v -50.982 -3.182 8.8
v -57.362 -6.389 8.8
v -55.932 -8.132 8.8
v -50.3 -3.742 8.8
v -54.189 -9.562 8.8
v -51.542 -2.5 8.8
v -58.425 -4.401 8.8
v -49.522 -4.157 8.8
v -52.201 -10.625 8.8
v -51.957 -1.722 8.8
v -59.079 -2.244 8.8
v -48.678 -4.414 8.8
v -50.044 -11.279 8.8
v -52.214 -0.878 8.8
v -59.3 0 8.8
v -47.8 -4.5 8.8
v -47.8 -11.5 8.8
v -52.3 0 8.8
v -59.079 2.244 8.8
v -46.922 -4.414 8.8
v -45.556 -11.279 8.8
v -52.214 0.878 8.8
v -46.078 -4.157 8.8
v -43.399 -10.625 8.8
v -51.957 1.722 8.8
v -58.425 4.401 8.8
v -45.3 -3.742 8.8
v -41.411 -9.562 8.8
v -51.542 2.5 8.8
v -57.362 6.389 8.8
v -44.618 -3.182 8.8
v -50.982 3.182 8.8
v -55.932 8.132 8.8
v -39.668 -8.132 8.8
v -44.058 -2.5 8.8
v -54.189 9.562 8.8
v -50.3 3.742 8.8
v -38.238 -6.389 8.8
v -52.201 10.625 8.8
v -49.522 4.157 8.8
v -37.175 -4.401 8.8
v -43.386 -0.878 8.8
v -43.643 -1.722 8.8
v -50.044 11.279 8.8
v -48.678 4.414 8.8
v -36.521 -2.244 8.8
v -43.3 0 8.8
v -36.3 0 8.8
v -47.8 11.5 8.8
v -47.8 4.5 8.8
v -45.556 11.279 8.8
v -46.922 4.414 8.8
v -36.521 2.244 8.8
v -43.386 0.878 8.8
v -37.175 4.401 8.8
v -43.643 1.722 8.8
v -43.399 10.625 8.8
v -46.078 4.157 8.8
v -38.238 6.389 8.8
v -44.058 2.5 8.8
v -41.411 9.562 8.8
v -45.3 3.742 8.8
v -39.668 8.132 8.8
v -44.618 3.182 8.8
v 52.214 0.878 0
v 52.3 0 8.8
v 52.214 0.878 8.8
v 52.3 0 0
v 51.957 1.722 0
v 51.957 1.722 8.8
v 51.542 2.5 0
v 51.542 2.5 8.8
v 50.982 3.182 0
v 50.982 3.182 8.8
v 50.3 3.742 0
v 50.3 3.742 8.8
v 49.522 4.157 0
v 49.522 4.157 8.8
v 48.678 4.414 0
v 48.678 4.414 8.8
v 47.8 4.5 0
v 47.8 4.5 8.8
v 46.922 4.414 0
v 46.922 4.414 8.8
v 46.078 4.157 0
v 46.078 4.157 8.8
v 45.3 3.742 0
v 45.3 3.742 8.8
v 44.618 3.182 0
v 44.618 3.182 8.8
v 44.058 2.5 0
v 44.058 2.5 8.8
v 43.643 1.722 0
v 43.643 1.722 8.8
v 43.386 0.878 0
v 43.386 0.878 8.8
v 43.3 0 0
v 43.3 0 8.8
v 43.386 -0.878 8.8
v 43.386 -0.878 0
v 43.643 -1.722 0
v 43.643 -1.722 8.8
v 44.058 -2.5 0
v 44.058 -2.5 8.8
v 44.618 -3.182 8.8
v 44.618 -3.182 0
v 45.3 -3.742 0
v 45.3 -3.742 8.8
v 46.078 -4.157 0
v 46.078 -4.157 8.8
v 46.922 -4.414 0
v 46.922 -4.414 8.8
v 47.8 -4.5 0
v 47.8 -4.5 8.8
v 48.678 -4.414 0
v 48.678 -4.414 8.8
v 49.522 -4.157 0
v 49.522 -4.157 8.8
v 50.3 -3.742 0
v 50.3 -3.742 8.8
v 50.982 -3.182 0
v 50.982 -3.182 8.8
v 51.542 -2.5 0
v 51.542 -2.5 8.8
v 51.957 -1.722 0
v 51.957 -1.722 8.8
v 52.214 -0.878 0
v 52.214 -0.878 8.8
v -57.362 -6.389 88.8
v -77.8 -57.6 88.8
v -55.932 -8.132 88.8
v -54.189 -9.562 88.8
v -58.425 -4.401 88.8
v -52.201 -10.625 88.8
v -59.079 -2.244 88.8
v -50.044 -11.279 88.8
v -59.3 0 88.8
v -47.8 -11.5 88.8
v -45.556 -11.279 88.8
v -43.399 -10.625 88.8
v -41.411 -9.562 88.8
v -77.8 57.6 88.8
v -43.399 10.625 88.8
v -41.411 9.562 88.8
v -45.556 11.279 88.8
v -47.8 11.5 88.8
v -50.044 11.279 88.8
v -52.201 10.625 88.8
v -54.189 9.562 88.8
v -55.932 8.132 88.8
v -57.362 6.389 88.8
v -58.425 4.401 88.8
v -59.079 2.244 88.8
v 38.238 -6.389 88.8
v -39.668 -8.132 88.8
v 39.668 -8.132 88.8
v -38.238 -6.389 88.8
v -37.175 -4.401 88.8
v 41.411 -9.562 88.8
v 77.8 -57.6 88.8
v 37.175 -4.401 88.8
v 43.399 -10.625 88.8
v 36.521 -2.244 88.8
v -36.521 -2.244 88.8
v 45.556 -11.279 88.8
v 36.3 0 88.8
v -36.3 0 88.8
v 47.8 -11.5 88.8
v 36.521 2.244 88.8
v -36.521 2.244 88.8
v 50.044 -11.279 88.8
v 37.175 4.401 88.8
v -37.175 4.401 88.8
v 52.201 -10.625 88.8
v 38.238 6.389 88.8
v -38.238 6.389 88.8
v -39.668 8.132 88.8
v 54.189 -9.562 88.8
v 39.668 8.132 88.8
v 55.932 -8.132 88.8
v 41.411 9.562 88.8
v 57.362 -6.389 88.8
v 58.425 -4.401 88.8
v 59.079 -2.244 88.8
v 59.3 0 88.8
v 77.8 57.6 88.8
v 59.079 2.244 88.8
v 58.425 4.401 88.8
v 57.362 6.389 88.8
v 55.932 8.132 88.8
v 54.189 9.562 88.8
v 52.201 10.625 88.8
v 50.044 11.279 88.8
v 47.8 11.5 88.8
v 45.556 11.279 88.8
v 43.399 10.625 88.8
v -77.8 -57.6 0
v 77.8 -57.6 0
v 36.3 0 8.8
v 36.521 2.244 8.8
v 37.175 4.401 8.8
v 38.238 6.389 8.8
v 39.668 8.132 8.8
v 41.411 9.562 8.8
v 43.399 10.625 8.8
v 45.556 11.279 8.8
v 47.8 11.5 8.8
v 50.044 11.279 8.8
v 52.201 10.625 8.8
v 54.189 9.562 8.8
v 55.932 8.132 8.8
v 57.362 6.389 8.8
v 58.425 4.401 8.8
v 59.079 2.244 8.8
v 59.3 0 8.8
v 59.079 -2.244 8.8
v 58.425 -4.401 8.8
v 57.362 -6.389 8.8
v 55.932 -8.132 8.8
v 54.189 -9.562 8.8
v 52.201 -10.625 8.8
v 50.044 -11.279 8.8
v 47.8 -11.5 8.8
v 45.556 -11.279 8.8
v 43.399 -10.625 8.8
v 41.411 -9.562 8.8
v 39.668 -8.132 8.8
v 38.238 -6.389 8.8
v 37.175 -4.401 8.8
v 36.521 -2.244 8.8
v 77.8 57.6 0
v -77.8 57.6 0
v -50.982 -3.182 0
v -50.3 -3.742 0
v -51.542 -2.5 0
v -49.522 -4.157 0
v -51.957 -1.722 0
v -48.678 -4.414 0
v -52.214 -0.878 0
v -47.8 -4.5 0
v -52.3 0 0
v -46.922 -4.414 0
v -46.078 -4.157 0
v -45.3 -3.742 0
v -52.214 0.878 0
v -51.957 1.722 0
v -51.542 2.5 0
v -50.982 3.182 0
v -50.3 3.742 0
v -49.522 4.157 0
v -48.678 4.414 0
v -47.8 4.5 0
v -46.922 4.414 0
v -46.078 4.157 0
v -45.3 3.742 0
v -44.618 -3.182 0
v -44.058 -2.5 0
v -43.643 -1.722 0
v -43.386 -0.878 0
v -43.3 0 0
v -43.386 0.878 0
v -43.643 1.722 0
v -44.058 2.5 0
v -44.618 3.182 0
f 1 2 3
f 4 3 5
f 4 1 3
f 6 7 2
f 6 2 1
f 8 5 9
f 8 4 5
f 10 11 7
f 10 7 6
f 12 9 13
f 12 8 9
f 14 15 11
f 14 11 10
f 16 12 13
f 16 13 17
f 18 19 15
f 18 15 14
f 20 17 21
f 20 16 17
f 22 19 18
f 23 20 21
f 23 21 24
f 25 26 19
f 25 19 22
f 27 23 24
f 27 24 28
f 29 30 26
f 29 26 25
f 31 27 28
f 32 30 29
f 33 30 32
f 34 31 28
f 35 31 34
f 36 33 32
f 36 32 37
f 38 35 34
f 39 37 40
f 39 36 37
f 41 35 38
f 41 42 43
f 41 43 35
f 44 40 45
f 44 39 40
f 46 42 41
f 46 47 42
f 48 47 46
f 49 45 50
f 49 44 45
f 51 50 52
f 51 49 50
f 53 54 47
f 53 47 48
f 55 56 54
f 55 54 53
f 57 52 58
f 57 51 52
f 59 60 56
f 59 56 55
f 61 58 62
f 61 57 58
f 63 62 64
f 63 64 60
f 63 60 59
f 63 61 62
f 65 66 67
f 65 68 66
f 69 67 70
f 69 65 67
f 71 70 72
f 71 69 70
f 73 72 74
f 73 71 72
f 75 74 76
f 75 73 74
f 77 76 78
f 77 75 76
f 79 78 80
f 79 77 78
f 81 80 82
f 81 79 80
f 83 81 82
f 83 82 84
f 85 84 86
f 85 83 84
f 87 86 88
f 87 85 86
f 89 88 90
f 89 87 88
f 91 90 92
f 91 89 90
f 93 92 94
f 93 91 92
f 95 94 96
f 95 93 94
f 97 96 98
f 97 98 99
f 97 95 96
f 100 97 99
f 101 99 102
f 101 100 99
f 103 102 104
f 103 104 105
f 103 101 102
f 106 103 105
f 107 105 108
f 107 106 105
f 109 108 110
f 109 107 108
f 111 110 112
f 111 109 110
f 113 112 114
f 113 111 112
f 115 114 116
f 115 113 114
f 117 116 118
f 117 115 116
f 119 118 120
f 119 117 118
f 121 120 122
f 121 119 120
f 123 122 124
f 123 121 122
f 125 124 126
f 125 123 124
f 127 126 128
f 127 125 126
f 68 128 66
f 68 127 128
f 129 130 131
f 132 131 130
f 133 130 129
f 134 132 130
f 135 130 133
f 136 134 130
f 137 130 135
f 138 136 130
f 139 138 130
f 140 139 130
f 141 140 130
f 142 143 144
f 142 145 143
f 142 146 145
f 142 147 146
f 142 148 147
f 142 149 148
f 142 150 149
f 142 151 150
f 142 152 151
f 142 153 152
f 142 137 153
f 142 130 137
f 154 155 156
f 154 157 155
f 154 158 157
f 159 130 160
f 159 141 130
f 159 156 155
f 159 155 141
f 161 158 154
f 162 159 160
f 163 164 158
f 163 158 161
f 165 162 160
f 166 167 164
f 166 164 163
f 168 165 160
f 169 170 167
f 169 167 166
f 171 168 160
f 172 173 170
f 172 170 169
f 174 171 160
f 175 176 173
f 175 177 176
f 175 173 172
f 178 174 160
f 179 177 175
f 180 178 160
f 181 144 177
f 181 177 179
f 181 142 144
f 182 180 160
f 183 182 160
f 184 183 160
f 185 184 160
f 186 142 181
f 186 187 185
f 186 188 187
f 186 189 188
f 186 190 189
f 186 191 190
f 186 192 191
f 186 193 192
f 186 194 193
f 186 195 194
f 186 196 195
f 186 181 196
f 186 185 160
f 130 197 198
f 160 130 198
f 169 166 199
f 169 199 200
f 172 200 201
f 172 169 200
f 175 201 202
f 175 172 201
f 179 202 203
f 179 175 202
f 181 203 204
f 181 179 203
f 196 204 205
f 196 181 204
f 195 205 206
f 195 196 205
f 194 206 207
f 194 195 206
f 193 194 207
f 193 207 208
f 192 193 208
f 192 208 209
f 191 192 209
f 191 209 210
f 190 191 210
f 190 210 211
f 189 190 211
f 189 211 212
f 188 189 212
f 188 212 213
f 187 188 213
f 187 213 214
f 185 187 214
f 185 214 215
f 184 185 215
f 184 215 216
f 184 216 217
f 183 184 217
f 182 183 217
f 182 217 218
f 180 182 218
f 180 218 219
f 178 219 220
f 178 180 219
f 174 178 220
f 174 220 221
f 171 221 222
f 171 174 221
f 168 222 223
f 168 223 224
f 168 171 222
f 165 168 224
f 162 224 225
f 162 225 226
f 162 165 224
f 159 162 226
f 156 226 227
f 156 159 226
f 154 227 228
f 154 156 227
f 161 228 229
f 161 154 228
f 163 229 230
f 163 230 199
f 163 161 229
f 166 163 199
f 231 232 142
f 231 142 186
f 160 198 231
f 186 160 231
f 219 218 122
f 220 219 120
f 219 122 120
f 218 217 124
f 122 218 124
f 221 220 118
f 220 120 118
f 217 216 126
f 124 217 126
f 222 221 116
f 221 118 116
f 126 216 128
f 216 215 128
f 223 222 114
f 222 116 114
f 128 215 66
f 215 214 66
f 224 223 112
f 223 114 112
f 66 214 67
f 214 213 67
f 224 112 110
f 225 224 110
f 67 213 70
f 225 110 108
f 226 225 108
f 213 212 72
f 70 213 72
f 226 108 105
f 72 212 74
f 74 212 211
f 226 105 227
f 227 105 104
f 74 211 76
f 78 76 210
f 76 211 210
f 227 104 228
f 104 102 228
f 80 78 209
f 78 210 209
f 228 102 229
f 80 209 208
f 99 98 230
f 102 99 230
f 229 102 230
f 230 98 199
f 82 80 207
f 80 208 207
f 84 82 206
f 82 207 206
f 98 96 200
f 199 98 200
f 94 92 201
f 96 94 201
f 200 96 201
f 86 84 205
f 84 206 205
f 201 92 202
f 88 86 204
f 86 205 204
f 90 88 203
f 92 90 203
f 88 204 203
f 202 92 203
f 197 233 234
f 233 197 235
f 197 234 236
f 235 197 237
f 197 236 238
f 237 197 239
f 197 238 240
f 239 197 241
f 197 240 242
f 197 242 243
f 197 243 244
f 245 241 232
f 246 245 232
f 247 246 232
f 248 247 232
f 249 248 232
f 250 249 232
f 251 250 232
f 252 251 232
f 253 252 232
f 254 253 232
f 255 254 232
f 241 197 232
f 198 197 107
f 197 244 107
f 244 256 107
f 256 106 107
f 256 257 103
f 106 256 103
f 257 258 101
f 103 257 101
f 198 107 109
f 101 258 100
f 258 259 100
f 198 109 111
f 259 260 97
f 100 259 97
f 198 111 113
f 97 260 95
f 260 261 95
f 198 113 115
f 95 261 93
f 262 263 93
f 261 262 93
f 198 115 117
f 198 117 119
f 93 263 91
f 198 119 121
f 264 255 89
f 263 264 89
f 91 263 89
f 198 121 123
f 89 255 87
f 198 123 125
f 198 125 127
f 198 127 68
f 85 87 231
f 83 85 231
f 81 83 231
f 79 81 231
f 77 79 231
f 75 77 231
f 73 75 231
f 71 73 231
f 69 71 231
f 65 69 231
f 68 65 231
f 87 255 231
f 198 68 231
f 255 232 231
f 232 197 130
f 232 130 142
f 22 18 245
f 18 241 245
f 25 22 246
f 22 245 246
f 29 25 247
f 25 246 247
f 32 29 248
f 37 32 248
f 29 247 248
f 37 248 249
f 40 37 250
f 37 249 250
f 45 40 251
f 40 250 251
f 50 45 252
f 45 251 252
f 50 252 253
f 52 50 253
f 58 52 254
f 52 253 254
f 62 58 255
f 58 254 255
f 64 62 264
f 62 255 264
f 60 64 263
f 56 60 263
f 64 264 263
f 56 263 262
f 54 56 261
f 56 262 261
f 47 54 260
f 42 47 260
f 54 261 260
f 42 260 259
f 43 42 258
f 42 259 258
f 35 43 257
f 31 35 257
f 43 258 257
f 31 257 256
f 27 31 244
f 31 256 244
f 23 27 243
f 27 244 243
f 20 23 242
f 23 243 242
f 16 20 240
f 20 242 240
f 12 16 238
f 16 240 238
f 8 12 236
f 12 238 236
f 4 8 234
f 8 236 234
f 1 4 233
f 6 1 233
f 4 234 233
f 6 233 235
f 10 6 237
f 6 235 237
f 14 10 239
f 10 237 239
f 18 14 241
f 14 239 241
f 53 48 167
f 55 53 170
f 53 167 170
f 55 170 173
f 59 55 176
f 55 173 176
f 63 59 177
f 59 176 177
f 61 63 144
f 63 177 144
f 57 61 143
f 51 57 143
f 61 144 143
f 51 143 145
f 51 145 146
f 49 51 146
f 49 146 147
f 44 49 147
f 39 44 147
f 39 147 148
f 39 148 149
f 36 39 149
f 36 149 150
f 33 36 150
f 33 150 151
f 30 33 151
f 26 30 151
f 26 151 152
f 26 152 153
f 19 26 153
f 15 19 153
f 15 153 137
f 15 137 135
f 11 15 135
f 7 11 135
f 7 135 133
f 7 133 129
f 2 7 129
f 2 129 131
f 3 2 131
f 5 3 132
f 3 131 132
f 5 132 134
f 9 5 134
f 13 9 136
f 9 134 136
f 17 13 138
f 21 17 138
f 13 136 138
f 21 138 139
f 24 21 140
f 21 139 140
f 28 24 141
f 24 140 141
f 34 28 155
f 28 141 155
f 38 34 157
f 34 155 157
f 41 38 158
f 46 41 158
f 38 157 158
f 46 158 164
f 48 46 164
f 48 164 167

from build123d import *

# Parameters (mm, degrees)
SKIZZE1_W                                           = 155.6
SKIZZE1_H                                           = 115.2
AUFSATZ_LINEAR_AUSTRAGEN1_DEPTH                     = 88.8
STIRNSENKUNG_F_R_M8_SENKSCHRAUBE_KOPF_B_D           = 9
STIRNSENKUNG_F_R_M8_SENKSCHRAUBE_KOPF_B_CBORE_D     = 23
STIRNSENKUNG_F_R_M8_SENKSCHRAUBE_KOPF_B_CBORE_DEPTH = 80


with BuildPart() as part:
    # Skizze1 → Aufsatz-Linear austragen1 (new body)
    with BuildSketch(Plane.XY):
        Rectangle(SKIZZE1_W, SKIZZE1_H)
    extrude(amount=AUFSATZ_LINEAR_AUSTRAGEN1_DEPTH)

    # Stirnsenkung für M8 Senkschraube (Kopf Button)1 (through all)
    with Locations(Plane.XY.offset(88.8)):
        with Locations((-47.8, 0)):
            stirnsenkung_f_r_m8_senkschraube_kopf_b = CounterBoreHole(STIRNSENKUNG_F_R_M8_SENKSCHRAUBE_KOPF_B_D / 2, STIRNSENKUNG_F_R_M8_SENKSCHRAUBE_KOPF_B_CBORE_D / 2, STIRNSENKUNG_F_R_M8_SENKSCHRAUBE_KOPF_B_CBORE_DEPTH)

    # Spiegeln1: Stirnsenkung für M8 Senkschraube (Kopf Button)1 across plane
    add(stirnsenkung_f_r_m8_senkschraube_kopf_b.mirror(Plane(origin=(0, 0, 0), x_dir=(0, 0, 1), z_dir=(1, 0, 0))), mode=Mode.SUBTRACT)


solid = part.part
